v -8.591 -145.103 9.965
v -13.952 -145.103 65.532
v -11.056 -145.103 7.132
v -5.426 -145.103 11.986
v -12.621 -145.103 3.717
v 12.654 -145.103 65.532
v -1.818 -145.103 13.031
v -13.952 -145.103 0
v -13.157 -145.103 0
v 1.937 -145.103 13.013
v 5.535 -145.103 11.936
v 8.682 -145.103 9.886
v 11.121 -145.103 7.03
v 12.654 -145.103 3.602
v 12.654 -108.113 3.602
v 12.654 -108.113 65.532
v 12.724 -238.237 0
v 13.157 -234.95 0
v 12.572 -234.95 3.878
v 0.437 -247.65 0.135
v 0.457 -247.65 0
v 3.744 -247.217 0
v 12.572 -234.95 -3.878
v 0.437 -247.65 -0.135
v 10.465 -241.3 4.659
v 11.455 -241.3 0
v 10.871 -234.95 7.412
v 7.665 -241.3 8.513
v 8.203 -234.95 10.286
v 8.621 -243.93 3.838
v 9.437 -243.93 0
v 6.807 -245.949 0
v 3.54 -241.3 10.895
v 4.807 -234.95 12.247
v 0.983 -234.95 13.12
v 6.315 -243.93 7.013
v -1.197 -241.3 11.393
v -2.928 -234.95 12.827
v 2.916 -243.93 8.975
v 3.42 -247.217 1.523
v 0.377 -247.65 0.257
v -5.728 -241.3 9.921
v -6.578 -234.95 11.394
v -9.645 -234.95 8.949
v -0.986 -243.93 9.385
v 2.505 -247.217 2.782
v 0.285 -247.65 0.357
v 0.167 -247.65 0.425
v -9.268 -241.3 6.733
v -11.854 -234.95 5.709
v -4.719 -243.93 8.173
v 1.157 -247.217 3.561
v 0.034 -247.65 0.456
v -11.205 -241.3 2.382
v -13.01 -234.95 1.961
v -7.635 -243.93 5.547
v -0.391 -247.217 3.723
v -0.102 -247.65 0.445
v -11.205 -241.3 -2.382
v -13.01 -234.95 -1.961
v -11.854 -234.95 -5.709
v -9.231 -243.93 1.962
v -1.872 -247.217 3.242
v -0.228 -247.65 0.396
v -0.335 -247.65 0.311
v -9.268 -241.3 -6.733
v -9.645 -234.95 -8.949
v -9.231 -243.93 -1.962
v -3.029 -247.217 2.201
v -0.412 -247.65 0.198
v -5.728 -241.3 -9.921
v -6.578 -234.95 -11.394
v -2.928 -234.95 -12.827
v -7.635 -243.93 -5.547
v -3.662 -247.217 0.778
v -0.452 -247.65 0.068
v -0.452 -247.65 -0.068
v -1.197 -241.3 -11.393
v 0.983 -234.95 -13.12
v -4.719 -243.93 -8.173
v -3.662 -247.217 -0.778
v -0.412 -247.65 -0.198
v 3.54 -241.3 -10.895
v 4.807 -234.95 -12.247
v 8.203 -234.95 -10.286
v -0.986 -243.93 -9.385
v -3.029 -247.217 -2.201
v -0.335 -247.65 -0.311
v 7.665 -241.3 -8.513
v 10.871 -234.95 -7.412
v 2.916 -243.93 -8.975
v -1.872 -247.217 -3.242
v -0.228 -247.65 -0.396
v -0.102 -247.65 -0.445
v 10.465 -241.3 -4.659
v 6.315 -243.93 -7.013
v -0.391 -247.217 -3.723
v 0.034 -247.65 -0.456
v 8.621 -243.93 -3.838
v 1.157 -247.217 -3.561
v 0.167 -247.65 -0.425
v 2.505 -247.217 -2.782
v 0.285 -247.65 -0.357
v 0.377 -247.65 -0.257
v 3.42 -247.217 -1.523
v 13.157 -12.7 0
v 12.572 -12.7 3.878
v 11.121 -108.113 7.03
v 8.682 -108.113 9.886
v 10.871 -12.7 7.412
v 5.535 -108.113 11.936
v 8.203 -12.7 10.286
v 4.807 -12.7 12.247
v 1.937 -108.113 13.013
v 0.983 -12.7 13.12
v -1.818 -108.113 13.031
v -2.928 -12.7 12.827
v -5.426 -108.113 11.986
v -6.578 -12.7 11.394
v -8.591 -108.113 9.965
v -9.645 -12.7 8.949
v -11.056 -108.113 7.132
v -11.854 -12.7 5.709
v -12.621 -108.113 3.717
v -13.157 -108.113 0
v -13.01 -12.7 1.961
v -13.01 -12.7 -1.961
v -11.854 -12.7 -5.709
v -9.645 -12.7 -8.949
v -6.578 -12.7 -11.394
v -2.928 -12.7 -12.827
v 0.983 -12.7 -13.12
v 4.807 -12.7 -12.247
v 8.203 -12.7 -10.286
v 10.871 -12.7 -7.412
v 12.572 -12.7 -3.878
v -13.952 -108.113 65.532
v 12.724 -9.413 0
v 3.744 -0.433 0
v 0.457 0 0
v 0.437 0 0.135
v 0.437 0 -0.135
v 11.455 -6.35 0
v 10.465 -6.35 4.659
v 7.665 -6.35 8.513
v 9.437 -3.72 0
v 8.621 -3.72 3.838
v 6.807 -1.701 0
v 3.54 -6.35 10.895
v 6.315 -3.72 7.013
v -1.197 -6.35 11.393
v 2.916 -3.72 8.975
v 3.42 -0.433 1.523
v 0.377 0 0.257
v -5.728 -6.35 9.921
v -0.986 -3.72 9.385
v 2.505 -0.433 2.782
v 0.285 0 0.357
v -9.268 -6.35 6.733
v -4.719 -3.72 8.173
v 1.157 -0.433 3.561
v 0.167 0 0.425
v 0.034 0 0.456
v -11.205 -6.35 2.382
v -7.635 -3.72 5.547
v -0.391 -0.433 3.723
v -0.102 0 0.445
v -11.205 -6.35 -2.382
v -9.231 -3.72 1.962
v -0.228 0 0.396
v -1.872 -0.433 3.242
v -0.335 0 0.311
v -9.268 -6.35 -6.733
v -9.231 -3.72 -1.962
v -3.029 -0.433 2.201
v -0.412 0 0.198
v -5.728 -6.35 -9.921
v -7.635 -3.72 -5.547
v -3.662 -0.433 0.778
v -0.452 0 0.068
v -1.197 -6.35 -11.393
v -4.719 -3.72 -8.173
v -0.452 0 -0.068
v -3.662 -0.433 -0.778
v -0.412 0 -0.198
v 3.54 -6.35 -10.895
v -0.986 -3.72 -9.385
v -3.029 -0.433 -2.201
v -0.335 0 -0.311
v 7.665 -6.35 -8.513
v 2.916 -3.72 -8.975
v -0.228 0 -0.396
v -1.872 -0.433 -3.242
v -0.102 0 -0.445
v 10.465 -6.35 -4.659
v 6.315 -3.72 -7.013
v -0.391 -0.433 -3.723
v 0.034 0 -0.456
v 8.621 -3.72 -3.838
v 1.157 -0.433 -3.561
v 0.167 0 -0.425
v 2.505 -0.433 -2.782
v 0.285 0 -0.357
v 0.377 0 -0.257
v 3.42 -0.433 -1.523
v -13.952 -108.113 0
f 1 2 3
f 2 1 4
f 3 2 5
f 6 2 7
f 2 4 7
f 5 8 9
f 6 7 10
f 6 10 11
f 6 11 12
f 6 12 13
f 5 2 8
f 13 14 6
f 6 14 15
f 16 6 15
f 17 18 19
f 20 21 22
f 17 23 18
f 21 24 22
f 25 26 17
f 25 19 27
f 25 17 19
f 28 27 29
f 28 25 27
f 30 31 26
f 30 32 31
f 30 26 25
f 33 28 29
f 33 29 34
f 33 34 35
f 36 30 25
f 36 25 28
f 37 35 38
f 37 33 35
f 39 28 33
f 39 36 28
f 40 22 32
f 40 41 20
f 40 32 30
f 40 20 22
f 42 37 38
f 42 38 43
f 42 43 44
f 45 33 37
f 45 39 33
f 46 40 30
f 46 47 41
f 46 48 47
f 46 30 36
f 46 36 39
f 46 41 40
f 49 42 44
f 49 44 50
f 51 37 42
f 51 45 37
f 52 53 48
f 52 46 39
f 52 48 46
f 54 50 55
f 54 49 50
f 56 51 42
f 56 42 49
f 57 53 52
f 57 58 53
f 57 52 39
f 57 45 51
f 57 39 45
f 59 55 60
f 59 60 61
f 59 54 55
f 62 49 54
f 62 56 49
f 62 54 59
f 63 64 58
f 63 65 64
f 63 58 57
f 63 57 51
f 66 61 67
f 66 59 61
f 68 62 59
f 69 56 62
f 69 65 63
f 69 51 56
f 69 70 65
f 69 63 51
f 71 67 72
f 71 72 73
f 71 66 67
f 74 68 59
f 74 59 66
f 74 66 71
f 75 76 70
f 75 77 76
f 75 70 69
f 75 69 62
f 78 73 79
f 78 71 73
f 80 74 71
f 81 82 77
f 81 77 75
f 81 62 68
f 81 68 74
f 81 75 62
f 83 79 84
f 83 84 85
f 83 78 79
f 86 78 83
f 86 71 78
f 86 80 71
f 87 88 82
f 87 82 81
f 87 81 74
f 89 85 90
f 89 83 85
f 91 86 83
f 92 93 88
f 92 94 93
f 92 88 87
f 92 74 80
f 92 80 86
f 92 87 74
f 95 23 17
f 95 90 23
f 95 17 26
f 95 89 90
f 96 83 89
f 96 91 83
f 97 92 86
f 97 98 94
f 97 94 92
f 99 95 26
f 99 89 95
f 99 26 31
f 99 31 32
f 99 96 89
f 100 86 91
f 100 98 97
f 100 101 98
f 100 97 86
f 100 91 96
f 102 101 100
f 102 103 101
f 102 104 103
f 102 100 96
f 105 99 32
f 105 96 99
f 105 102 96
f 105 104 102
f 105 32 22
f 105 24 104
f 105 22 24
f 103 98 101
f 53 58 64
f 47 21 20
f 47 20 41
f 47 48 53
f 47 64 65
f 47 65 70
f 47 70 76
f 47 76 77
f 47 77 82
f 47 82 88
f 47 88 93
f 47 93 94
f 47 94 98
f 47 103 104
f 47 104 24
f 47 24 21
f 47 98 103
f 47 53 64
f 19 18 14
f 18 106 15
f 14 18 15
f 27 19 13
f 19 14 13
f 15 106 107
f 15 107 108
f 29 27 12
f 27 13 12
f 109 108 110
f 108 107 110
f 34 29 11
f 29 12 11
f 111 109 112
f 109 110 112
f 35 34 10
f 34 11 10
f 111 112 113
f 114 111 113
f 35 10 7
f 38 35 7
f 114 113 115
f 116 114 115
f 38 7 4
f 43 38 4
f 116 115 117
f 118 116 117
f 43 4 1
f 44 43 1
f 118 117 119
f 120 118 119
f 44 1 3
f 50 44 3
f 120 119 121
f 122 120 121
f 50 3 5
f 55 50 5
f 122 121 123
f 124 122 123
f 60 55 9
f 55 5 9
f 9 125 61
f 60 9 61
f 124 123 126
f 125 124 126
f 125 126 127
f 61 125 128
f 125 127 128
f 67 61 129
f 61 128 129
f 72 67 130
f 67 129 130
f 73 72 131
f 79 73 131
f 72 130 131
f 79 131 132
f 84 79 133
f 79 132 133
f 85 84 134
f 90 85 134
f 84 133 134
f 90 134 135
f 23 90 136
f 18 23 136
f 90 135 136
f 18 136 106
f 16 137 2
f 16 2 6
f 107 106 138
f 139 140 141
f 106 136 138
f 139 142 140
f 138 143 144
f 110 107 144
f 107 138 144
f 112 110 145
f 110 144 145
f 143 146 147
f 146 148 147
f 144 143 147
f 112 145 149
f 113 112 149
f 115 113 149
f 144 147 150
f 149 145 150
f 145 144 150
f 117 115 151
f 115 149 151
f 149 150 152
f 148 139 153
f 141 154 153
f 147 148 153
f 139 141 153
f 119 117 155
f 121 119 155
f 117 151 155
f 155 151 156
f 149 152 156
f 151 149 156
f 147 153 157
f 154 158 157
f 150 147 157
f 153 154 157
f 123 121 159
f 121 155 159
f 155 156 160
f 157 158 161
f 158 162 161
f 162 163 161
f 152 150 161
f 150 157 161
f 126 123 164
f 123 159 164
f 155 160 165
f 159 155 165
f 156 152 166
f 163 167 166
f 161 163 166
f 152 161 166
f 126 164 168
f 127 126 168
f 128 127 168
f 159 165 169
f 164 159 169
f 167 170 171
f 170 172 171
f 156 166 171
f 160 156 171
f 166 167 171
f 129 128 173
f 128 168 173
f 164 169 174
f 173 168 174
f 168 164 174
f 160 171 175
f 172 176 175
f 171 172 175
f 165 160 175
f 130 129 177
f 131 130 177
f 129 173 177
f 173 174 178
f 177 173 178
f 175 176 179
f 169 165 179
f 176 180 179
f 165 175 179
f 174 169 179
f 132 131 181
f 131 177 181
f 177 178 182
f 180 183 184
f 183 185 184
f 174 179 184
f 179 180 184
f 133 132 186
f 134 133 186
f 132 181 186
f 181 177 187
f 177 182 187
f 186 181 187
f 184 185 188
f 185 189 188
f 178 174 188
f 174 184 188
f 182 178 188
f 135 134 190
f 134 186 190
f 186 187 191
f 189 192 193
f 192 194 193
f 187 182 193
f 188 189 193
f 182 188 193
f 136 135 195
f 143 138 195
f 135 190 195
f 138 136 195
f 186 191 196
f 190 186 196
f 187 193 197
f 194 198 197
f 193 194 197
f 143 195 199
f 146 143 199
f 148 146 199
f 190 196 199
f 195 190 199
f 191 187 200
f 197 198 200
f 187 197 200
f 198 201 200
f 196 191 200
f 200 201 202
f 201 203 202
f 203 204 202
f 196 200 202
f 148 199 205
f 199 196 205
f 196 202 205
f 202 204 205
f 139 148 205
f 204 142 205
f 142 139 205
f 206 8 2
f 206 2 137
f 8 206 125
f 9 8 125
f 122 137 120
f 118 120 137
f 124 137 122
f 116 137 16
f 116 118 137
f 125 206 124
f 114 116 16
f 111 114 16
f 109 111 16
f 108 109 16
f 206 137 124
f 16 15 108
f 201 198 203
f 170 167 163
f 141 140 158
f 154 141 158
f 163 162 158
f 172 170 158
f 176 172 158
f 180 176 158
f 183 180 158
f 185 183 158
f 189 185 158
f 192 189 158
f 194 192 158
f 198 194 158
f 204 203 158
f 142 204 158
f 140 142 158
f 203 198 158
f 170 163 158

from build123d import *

# Parameters (mm, degrees)
F0_R     = 13.156852
F1_DEPTH = 247.65
F2_W     = 26.60638
F2_H     = 36.989354
F3_DEPTH = 65.532
F4_R     = 12.7
F5_R     = 12.7
F6_W     = 214.072559
F6_H     = 7.634542
F7_DEPTH = 11.43
F8_W     = 215.813644
F8_H     = 7.254239
F9_DEPTH = 8.89


with BuildPart() as f1:
    # F0 (on Front) → F1 (new body)
    with BuildSketch(Plane.XZ):
        Circle(F0_R)
    extrude(amount=F1_DEPTH)

    # F2 (on Top) → F3 (join)
    with BuildSketch(Plane.XY):
        with Locations((-0.648935, -126.607973)):
            Rectangle(F2_W, F2_H)
    extrude(amount=F3_DEPTH)

    # F4
    f4_edges = [f1.edges().sort_by_distance(p)[0] for p in [
        (-13.156852, -247.65, 0),
    ]]
    fillet(f4_edges, radius=F4_R)

    # F5
    f5_edges = [f1.edges().sort_by_distance(p)[0] for p in [
        (-13.156852, 0, 0),
    ]]
    fillet(f5_edges, radius=F5_R)

    # F6 (on Right) → F7 (join)
    with BuildSketch(Plane.YZ):
        with Locations((-123.286945, 0)):
            Rectangle(F6_W, F6_H)
    extrude(amount=-F7_DEPTH)

    # F8 (on Right) → F9 (join)
    with BuildSketch(Plane.YZ):
        with Locations((-124.603193, -0.566737)):
            Rectangle(F8_W, F8_H)
    extrude(amount=F9_DEPTH)


solid = f1.part
